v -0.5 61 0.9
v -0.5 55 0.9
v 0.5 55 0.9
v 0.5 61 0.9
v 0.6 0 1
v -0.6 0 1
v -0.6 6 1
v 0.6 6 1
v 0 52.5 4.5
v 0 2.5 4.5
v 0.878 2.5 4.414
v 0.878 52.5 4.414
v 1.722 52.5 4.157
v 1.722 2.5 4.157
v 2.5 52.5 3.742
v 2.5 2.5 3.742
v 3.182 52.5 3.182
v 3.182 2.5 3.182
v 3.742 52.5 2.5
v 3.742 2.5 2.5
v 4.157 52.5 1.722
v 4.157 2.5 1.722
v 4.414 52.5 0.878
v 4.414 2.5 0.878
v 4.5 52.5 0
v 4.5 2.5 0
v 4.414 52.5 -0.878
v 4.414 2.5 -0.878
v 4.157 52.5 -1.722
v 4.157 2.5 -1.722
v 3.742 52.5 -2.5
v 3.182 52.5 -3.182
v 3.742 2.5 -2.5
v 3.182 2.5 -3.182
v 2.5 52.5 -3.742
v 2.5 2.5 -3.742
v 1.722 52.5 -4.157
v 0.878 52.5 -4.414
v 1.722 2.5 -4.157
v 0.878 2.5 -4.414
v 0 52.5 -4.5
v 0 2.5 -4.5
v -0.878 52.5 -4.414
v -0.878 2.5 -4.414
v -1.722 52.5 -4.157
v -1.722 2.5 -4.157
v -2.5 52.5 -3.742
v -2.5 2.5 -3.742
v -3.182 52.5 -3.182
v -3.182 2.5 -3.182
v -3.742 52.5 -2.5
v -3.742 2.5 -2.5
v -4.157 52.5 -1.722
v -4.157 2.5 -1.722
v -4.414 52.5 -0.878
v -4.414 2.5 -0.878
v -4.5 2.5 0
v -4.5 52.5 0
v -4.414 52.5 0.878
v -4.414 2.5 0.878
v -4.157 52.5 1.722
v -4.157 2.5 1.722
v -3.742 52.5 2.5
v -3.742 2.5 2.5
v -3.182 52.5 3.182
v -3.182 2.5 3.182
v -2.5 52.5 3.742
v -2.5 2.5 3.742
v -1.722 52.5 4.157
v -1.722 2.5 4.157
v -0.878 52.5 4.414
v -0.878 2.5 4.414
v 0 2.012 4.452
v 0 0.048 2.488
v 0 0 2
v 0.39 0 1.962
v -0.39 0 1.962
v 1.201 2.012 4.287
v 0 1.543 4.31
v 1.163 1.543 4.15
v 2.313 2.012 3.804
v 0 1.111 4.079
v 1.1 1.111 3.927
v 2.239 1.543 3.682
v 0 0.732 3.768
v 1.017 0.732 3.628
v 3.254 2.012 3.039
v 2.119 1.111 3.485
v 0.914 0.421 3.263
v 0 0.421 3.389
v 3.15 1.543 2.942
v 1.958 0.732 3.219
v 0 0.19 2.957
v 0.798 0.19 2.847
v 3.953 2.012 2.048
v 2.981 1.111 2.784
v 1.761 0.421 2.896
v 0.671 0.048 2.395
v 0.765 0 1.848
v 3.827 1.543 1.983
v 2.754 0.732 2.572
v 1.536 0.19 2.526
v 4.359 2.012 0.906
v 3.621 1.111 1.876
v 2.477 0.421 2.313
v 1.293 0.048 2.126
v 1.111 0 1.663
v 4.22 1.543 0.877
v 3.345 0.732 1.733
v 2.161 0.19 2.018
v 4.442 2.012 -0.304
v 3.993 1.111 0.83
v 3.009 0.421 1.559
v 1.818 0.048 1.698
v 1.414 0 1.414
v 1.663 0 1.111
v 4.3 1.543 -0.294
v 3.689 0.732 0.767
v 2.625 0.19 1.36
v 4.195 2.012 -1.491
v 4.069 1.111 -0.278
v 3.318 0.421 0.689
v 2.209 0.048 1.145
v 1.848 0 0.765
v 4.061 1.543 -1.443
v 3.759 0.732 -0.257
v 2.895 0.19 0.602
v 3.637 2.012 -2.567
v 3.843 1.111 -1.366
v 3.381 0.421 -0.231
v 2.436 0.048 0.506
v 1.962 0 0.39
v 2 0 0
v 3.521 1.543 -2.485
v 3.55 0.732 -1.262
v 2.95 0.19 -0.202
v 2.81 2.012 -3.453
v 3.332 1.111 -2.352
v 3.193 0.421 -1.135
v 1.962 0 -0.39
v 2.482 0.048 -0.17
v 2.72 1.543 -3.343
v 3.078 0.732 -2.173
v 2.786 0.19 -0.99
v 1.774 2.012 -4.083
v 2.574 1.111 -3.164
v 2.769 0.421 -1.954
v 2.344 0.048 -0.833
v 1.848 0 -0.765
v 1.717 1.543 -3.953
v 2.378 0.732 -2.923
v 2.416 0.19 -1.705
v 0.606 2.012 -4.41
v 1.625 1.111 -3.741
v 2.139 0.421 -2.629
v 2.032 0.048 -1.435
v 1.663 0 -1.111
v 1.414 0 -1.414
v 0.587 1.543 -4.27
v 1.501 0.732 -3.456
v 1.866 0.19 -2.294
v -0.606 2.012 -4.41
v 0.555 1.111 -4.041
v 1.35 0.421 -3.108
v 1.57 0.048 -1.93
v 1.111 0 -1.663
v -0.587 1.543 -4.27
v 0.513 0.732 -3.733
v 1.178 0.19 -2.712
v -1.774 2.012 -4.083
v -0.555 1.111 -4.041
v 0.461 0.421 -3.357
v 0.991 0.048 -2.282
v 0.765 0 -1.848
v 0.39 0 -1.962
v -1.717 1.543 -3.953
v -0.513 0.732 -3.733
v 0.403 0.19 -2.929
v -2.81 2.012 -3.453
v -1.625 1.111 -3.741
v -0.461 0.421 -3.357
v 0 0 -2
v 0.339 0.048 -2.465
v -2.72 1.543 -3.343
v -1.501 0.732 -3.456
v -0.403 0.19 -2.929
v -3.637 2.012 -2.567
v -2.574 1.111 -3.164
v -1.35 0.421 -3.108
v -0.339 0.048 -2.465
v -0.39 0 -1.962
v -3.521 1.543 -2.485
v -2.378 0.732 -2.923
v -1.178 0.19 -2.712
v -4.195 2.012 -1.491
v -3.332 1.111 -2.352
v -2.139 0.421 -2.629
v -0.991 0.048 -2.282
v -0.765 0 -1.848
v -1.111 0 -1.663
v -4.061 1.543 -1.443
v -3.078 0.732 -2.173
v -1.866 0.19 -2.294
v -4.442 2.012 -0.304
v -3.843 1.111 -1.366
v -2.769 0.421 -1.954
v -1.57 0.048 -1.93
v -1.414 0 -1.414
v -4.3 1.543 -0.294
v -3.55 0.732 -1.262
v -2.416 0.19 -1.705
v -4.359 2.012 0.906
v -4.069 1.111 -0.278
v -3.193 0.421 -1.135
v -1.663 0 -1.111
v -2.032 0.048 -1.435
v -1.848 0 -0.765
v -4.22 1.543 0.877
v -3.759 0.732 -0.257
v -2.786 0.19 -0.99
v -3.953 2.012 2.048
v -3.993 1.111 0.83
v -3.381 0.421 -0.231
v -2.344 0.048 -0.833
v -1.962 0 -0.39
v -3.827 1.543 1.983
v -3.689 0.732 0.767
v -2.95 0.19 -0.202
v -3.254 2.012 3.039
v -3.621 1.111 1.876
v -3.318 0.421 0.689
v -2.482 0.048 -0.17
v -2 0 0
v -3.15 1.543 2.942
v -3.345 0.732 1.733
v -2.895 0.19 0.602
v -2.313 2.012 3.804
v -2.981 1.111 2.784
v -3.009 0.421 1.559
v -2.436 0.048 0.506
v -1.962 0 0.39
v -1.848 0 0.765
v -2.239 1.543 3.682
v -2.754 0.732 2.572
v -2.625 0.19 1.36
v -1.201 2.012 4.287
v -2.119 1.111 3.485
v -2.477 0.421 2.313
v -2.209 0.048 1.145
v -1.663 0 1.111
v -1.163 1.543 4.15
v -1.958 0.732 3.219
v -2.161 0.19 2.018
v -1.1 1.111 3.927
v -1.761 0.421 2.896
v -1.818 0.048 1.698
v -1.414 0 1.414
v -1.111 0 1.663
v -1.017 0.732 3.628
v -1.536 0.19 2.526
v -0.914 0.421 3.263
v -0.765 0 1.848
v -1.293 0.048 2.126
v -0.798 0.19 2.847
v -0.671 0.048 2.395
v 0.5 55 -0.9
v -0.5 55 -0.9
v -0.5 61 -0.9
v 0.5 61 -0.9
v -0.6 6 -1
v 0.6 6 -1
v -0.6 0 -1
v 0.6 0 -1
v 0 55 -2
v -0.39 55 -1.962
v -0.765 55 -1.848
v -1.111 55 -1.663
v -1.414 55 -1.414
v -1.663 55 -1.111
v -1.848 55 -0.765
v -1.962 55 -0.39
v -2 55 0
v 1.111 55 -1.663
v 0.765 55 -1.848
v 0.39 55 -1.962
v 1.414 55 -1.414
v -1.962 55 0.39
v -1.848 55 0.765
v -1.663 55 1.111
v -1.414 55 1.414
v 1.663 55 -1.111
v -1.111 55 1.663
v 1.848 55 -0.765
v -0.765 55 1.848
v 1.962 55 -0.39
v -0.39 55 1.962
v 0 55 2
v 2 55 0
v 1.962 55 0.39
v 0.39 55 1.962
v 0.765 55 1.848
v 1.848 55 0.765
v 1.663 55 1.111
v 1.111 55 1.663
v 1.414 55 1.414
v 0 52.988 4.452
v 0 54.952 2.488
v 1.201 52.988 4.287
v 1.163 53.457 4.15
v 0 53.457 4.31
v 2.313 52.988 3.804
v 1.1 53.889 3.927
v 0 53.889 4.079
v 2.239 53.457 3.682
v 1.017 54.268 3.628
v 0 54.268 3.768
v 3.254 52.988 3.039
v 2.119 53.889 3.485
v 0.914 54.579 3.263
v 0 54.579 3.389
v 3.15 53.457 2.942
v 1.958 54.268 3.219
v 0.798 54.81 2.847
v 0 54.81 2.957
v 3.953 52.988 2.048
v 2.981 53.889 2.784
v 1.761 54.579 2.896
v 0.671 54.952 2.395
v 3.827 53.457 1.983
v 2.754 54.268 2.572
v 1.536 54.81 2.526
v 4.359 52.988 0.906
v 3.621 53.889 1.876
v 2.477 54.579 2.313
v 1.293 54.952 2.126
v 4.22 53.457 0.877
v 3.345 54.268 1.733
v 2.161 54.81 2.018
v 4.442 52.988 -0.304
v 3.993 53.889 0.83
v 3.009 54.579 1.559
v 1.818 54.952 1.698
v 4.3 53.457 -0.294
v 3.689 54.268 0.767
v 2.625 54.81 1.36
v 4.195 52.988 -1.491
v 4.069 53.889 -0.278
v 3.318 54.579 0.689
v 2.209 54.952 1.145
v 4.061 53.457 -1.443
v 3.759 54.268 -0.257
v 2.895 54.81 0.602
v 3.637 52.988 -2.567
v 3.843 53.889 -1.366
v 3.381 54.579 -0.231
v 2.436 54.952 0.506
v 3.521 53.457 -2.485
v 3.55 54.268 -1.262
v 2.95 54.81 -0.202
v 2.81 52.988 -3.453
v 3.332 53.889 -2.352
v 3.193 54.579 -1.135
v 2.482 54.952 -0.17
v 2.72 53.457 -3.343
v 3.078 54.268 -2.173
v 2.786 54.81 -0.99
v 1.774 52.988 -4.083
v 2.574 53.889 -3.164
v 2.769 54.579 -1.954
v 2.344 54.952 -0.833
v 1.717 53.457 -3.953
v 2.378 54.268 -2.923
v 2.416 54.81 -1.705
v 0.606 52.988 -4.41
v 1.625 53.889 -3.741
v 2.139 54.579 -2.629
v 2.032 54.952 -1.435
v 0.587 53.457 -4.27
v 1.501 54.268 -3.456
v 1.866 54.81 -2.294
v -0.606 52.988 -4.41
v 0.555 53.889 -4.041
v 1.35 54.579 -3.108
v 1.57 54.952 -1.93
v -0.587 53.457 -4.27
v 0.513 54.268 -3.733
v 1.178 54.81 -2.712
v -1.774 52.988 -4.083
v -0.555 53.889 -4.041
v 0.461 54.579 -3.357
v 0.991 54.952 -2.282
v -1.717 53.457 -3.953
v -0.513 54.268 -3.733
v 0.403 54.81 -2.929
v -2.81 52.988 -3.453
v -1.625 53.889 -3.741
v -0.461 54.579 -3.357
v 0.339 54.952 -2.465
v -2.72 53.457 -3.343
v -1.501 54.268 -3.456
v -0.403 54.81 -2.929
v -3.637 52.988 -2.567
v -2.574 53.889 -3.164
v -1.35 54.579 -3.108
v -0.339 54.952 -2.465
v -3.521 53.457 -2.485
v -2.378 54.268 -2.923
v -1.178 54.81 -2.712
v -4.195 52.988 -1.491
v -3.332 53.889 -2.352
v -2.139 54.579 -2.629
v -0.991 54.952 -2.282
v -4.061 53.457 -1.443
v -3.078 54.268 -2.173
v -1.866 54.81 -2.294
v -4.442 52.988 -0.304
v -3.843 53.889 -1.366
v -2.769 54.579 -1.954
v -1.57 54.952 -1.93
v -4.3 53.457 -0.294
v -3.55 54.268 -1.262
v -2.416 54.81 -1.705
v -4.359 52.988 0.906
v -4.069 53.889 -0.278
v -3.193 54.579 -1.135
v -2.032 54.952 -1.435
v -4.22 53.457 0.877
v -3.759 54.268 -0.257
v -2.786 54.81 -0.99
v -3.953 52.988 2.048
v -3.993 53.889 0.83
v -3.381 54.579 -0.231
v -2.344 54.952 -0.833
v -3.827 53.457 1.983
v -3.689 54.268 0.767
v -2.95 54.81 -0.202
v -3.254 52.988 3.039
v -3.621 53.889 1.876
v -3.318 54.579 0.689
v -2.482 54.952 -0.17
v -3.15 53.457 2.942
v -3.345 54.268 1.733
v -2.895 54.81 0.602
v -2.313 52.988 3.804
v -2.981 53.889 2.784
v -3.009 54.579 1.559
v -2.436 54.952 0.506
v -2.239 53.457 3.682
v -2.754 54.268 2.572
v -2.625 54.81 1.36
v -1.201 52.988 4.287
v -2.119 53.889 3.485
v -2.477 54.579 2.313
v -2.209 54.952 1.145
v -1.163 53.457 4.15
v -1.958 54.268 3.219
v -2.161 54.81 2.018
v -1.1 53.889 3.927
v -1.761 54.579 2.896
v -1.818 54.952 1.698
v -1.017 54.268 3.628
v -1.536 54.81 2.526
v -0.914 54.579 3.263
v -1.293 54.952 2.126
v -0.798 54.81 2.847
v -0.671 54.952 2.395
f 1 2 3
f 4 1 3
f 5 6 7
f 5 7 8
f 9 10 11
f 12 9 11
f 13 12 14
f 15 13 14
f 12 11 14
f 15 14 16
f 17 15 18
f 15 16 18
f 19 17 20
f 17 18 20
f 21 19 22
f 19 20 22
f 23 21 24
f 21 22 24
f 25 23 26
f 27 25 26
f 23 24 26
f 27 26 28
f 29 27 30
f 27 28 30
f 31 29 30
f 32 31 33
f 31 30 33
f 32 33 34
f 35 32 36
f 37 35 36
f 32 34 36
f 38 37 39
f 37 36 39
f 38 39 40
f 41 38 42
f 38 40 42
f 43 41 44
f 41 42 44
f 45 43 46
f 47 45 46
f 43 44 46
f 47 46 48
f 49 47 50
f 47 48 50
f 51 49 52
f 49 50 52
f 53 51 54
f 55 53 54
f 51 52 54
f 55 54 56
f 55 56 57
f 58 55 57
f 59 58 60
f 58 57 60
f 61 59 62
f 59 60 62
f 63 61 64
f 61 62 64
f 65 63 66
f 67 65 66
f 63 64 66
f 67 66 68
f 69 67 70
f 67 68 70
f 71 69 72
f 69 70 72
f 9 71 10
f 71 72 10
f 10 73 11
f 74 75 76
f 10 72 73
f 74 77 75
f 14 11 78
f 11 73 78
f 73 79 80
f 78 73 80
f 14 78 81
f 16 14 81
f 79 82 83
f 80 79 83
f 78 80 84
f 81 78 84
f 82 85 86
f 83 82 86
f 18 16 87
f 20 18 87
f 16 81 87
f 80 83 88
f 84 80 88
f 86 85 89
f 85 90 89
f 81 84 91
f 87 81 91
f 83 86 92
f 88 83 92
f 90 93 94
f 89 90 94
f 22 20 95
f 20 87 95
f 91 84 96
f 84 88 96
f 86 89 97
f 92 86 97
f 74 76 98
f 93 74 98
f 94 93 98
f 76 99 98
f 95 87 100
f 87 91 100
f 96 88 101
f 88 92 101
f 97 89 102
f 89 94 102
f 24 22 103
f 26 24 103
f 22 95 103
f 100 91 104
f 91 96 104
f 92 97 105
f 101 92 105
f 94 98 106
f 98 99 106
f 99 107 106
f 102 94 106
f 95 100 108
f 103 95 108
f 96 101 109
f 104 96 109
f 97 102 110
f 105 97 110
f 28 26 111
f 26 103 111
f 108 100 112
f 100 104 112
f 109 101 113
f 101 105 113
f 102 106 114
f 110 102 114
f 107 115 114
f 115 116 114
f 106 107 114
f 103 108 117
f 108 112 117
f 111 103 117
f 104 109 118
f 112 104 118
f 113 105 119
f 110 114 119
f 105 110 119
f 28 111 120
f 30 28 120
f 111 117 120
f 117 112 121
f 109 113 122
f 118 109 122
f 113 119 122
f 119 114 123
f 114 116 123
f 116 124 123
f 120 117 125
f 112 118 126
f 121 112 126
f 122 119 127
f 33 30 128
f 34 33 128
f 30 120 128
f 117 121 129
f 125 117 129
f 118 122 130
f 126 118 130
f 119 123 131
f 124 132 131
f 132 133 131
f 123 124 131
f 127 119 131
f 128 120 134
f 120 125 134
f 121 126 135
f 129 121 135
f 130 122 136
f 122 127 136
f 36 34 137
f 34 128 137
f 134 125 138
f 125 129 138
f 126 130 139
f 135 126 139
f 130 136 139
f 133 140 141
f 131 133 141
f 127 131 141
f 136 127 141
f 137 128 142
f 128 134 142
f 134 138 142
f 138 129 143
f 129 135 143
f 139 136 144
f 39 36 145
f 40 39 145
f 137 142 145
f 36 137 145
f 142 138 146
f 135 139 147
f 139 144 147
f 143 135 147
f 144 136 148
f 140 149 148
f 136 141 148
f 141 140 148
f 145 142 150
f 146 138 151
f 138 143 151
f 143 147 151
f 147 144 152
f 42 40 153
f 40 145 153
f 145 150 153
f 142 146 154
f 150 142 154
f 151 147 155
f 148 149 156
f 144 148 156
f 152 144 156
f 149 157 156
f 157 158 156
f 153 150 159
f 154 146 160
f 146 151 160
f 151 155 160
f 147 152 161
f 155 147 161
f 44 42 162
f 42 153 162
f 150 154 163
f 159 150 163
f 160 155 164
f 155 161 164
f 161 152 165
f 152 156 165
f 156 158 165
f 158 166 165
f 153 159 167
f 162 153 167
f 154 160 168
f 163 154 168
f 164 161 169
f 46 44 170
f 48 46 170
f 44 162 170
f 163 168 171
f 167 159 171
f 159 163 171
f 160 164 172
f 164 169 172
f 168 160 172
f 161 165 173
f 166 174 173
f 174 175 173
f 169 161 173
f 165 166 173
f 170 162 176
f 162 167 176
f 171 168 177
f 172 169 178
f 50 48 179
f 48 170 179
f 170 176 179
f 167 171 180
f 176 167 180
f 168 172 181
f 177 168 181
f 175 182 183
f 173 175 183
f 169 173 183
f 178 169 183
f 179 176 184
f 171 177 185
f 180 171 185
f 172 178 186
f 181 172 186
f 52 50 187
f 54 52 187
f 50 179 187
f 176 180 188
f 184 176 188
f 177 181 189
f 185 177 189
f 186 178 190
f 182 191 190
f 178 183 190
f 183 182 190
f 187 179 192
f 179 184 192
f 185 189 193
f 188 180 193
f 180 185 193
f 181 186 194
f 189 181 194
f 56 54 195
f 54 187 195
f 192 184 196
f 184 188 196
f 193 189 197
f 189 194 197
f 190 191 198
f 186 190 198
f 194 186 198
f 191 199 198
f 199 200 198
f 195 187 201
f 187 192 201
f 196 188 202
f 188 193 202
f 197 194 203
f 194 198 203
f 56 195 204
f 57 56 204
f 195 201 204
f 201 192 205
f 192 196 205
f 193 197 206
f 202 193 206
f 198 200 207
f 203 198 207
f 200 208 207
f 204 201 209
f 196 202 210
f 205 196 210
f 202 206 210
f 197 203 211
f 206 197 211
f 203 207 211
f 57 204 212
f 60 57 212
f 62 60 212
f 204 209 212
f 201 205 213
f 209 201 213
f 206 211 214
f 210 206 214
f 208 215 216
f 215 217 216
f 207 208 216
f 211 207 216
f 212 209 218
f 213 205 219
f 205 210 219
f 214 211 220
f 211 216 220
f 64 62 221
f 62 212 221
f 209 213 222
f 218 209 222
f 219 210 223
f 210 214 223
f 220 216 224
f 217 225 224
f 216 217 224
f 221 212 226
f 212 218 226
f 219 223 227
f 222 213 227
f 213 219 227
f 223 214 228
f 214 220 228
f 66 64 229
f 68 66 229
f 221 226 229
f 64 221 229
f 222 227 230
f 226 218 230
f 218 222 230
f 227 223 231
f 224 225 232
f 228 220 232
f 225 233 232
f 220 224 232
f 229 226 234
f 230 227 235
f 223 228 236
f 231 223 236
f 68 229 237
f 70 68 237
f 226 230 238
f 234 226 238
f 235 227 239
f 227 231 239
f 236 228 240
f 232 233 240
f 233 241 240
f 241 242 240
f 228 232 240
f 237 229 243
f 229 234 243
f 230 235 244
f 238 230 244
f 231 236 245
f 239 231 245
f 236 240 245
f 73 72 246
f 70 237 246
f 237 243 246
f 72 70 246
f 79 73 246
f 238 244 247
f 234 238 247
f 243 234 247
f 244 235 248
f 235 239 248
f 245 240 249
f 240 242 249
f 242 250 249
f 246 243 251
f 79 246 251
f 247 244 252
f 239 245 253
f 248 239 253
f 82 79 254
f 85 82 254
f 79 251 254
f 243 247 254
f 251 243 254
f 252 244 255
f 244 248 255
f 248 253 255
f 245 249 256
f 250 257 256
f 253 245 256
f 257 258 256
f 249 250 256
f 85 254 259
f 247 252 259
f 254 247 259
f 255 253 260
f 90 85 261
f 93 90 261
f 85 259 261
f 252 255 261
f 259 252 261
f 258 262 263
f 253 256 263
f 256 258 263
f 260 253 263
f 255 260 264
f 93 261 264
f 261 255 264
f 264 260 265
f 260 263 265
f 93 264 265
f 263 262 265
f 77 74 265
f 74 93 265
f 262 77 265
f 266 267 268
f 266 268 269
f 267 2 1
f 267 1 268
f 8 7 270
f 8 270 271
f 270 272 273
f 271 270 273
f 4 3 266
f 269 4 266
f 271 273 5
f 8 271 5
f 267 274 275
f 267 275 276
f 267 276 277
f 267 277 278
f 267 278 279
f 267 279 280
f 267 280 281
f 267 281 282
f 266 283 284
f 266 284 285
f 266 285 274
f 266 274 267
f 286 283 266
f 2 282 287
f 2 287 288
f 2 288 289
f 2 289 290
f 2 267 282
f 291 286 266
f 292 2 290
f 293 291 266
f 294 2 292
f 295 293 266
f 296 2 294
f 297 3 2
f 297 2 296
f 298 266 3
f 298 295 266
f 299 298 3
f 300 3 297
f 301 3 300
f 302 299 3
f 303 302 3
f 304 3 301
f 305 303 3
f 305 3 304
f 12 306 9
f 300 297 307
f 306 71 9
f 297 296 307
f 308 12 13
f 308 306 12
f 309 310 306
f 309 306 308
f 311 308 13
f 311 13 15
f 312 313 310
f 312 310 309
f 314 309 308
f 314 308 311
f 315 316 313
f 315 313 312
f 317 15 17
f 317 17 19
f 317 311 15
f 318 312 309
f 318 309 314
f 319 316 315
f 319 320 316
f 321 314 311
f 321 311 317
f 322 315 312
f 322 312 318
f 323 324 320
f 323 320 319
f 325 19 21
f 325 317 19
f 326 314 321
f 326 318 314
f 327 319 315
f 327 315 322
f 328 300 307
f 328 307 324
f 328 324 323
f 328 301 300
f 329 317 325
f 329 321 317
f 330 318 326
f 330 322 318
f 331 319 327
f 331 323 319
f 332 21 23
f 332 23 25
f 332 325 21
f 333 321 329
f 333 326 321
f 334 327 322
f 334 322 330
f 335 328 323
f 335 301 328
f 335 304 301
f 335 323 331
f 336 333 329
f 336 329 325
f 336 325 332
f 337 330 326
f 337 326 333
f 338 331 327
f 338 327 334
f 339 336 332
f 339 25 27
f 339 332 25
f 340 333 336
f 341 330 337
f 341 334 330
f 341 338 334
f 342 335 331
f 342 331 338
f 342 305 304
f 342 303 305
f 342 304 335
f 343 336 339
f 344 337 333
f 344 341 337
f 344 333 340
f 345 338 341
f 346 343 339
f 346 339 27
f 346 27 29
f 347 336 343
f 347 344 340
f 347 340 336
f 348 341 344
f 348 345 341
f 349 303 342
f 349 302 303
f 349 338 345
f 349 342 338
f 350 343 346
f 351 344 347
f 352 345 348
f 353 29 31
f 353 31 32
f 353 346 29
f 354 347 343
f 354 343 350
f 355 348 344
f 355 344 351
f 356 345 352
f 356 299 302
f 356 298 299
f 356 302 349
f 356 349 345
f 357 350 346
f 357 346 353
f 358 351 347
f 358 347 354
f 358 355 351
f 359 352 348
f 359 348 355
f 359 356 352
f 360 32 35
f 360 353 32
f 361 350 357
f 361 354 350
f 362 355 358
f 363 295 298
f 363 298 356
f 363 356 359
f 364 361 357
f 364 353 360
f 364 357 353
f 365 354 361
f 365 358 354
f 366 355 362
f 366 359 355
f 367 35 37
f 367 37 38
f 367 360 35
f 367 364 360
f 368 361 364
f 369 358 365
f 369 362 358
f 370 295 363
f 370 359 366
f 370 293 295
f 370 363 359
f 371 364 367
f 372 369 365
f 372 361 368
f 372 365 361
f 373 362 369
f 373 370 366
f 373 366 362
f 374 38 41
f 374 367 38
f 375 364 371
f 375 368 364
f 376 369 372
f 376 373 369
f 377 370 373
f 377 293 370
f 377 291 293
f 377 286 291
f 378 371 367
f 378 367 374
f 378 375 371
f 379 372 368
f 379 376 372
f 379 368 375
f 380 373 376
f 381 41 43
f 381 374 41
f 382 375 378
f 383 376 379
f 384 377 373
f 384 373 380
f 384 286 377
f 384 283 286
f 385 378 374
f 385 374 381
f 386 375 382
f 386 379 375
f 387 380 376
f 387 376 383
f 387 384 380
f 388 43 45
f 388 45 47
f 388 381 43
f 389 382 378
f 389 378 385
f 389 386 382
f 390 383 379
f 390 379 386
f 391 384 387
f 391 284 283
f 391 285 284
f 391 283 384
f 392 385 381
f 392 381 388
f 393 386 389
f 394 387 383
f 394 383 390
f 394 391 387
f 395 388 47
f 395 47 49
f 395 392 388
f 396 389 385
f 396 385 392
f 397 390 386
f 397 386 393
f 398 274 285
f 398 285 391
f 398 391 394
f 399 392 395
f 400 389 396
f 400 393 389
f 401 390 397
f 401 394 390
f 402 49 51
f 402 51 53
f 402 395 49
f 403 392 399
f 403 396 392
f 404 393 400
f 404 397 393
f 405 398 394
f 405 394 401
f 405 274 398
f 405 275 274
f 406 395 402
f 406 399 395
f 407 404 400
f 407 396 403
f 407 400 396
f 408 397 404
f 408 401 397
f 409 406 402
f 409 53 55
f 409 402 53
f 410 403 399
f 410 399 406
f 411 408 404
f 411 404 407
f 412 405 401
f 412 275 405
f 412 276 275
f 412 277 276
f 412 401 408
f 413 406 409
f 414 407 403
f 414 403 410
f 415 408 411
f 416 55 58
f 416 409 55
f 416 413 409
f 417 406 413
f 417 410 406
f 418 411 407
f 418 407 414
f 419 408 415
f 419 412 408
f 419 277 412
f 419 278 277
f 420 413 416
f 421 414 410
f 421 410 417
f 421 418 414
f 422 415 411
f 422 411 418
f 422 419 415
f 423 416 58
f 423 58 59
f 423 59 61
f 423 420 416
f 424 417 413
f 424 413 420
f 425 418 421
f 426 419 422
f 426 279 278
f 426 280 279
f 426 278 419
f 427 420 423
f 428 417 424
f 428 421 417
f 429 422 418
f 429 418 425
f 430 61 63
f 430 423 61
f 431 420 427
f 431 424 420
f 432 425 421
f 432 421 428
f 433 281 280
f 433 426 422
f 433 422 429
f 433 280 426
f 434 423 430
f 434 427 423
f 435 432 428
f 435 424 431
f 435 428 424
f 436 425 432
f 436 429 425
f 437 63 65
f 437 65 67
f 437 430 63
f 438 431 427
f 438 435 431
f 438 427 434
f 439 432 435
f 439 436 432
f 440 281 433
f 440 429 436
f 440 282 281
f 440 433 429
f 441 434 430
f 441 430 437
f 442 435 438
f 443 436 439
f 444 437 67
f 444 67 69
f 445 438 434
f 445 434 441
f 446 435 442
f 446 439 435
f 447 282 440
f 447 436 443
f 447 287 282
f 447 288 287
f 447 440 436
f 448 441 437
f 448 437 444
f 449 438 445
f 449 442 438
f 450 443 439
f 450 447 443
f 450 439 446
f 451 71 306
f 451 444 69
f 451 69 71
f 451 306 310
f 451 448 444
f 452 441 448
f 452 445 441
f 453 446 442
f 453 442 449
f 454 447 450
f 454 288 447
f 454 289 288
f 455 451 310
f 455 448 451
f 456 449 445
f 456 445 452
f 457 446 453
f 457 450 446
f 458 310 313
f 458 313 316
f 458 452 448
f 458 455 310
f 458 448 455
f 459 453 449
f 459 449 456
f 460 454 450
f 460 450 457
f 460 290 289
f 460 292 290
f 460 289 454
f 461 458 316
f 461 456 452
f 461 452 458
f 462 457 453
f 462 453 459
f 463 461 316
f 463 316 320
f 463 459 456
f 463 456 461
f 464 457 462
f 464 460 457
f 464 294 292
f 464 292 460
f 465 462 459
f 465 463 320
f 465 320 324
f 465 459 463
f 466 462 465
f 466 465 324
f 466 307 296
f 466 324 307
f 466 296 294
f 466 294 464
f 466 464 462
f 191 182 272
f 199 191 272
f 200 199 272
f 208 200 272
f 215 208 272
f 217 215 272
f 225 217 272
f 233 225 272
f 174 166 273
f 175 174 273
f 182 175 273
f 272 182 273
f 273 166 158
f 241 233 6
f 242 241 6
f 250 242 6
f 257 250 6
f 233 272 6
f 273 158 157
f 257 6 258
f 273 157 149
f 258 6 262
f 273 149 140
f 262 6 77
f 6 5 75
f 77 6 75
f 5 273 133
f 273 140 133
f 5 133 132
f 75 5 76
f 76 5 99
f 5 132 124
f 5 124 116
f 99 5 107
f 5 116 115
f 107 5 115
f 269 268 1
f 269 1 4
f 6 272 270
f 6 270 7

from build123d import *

# Parameters (mm, degrees)
SKETCH1_R           = 4.5
BOSS_EXTRUDE1_DEPTH = 55
SKETCH2_W           = 1
SKETCH2_H           = 1.8
BOSS_EXTRUDE2_DEPTH = 6
SKETCH3_W           = 1.2
SKETCH3_H           = 2
CUT_EXTRUDE1_DEPTH  = 6
FILLET1_R           = 2.5


with BuildPart() as part:
    # Sketch1 → Boss-Extrude1 (new body)
    with BuildSketch(Plane(origin=(0, 0, 0), x_dir=(1, 0, 0), z_dir=(0, 1, 0))):
        with Locations(Location((0, 0, 0), (0, 0, 270))):
            Circle(SKETCH1_R)
    extrude(amount=BOSS_EXTRUDE1_DEPTH)

    # Sketch2 → Boss-Extrude2 (add)
    with BuildSketch(Plane(origin=(0, 55, 0), x_dir=(1, 0, 0), z_dir=(0, 1, 0))):
        Rectangle(SKETCH2_W, SKETCH2_H)
    extrude(amount=BOSS_EXTRUDE2_DEPTH)

    # Sketch3 → Cut-Extrude1 (cut)
    with BuildSketch(Plane.XZ):
        Rectangle(SKETCH3_W, SKETCH3_H)
    extrude(amount=-CUT_EXTRUDE1_DEPTH, mode=Mode.SUBTRACT)

    # Fillet1
    fillet1_edges = [part.edges().sort_by_distance(p)[0] for p in [
        (0, 0, -4.5),
        (0, 55, -4.5),
    ]]
    fillet(fillet1_edges, radius=FILLET1_R)


solid = part.part
